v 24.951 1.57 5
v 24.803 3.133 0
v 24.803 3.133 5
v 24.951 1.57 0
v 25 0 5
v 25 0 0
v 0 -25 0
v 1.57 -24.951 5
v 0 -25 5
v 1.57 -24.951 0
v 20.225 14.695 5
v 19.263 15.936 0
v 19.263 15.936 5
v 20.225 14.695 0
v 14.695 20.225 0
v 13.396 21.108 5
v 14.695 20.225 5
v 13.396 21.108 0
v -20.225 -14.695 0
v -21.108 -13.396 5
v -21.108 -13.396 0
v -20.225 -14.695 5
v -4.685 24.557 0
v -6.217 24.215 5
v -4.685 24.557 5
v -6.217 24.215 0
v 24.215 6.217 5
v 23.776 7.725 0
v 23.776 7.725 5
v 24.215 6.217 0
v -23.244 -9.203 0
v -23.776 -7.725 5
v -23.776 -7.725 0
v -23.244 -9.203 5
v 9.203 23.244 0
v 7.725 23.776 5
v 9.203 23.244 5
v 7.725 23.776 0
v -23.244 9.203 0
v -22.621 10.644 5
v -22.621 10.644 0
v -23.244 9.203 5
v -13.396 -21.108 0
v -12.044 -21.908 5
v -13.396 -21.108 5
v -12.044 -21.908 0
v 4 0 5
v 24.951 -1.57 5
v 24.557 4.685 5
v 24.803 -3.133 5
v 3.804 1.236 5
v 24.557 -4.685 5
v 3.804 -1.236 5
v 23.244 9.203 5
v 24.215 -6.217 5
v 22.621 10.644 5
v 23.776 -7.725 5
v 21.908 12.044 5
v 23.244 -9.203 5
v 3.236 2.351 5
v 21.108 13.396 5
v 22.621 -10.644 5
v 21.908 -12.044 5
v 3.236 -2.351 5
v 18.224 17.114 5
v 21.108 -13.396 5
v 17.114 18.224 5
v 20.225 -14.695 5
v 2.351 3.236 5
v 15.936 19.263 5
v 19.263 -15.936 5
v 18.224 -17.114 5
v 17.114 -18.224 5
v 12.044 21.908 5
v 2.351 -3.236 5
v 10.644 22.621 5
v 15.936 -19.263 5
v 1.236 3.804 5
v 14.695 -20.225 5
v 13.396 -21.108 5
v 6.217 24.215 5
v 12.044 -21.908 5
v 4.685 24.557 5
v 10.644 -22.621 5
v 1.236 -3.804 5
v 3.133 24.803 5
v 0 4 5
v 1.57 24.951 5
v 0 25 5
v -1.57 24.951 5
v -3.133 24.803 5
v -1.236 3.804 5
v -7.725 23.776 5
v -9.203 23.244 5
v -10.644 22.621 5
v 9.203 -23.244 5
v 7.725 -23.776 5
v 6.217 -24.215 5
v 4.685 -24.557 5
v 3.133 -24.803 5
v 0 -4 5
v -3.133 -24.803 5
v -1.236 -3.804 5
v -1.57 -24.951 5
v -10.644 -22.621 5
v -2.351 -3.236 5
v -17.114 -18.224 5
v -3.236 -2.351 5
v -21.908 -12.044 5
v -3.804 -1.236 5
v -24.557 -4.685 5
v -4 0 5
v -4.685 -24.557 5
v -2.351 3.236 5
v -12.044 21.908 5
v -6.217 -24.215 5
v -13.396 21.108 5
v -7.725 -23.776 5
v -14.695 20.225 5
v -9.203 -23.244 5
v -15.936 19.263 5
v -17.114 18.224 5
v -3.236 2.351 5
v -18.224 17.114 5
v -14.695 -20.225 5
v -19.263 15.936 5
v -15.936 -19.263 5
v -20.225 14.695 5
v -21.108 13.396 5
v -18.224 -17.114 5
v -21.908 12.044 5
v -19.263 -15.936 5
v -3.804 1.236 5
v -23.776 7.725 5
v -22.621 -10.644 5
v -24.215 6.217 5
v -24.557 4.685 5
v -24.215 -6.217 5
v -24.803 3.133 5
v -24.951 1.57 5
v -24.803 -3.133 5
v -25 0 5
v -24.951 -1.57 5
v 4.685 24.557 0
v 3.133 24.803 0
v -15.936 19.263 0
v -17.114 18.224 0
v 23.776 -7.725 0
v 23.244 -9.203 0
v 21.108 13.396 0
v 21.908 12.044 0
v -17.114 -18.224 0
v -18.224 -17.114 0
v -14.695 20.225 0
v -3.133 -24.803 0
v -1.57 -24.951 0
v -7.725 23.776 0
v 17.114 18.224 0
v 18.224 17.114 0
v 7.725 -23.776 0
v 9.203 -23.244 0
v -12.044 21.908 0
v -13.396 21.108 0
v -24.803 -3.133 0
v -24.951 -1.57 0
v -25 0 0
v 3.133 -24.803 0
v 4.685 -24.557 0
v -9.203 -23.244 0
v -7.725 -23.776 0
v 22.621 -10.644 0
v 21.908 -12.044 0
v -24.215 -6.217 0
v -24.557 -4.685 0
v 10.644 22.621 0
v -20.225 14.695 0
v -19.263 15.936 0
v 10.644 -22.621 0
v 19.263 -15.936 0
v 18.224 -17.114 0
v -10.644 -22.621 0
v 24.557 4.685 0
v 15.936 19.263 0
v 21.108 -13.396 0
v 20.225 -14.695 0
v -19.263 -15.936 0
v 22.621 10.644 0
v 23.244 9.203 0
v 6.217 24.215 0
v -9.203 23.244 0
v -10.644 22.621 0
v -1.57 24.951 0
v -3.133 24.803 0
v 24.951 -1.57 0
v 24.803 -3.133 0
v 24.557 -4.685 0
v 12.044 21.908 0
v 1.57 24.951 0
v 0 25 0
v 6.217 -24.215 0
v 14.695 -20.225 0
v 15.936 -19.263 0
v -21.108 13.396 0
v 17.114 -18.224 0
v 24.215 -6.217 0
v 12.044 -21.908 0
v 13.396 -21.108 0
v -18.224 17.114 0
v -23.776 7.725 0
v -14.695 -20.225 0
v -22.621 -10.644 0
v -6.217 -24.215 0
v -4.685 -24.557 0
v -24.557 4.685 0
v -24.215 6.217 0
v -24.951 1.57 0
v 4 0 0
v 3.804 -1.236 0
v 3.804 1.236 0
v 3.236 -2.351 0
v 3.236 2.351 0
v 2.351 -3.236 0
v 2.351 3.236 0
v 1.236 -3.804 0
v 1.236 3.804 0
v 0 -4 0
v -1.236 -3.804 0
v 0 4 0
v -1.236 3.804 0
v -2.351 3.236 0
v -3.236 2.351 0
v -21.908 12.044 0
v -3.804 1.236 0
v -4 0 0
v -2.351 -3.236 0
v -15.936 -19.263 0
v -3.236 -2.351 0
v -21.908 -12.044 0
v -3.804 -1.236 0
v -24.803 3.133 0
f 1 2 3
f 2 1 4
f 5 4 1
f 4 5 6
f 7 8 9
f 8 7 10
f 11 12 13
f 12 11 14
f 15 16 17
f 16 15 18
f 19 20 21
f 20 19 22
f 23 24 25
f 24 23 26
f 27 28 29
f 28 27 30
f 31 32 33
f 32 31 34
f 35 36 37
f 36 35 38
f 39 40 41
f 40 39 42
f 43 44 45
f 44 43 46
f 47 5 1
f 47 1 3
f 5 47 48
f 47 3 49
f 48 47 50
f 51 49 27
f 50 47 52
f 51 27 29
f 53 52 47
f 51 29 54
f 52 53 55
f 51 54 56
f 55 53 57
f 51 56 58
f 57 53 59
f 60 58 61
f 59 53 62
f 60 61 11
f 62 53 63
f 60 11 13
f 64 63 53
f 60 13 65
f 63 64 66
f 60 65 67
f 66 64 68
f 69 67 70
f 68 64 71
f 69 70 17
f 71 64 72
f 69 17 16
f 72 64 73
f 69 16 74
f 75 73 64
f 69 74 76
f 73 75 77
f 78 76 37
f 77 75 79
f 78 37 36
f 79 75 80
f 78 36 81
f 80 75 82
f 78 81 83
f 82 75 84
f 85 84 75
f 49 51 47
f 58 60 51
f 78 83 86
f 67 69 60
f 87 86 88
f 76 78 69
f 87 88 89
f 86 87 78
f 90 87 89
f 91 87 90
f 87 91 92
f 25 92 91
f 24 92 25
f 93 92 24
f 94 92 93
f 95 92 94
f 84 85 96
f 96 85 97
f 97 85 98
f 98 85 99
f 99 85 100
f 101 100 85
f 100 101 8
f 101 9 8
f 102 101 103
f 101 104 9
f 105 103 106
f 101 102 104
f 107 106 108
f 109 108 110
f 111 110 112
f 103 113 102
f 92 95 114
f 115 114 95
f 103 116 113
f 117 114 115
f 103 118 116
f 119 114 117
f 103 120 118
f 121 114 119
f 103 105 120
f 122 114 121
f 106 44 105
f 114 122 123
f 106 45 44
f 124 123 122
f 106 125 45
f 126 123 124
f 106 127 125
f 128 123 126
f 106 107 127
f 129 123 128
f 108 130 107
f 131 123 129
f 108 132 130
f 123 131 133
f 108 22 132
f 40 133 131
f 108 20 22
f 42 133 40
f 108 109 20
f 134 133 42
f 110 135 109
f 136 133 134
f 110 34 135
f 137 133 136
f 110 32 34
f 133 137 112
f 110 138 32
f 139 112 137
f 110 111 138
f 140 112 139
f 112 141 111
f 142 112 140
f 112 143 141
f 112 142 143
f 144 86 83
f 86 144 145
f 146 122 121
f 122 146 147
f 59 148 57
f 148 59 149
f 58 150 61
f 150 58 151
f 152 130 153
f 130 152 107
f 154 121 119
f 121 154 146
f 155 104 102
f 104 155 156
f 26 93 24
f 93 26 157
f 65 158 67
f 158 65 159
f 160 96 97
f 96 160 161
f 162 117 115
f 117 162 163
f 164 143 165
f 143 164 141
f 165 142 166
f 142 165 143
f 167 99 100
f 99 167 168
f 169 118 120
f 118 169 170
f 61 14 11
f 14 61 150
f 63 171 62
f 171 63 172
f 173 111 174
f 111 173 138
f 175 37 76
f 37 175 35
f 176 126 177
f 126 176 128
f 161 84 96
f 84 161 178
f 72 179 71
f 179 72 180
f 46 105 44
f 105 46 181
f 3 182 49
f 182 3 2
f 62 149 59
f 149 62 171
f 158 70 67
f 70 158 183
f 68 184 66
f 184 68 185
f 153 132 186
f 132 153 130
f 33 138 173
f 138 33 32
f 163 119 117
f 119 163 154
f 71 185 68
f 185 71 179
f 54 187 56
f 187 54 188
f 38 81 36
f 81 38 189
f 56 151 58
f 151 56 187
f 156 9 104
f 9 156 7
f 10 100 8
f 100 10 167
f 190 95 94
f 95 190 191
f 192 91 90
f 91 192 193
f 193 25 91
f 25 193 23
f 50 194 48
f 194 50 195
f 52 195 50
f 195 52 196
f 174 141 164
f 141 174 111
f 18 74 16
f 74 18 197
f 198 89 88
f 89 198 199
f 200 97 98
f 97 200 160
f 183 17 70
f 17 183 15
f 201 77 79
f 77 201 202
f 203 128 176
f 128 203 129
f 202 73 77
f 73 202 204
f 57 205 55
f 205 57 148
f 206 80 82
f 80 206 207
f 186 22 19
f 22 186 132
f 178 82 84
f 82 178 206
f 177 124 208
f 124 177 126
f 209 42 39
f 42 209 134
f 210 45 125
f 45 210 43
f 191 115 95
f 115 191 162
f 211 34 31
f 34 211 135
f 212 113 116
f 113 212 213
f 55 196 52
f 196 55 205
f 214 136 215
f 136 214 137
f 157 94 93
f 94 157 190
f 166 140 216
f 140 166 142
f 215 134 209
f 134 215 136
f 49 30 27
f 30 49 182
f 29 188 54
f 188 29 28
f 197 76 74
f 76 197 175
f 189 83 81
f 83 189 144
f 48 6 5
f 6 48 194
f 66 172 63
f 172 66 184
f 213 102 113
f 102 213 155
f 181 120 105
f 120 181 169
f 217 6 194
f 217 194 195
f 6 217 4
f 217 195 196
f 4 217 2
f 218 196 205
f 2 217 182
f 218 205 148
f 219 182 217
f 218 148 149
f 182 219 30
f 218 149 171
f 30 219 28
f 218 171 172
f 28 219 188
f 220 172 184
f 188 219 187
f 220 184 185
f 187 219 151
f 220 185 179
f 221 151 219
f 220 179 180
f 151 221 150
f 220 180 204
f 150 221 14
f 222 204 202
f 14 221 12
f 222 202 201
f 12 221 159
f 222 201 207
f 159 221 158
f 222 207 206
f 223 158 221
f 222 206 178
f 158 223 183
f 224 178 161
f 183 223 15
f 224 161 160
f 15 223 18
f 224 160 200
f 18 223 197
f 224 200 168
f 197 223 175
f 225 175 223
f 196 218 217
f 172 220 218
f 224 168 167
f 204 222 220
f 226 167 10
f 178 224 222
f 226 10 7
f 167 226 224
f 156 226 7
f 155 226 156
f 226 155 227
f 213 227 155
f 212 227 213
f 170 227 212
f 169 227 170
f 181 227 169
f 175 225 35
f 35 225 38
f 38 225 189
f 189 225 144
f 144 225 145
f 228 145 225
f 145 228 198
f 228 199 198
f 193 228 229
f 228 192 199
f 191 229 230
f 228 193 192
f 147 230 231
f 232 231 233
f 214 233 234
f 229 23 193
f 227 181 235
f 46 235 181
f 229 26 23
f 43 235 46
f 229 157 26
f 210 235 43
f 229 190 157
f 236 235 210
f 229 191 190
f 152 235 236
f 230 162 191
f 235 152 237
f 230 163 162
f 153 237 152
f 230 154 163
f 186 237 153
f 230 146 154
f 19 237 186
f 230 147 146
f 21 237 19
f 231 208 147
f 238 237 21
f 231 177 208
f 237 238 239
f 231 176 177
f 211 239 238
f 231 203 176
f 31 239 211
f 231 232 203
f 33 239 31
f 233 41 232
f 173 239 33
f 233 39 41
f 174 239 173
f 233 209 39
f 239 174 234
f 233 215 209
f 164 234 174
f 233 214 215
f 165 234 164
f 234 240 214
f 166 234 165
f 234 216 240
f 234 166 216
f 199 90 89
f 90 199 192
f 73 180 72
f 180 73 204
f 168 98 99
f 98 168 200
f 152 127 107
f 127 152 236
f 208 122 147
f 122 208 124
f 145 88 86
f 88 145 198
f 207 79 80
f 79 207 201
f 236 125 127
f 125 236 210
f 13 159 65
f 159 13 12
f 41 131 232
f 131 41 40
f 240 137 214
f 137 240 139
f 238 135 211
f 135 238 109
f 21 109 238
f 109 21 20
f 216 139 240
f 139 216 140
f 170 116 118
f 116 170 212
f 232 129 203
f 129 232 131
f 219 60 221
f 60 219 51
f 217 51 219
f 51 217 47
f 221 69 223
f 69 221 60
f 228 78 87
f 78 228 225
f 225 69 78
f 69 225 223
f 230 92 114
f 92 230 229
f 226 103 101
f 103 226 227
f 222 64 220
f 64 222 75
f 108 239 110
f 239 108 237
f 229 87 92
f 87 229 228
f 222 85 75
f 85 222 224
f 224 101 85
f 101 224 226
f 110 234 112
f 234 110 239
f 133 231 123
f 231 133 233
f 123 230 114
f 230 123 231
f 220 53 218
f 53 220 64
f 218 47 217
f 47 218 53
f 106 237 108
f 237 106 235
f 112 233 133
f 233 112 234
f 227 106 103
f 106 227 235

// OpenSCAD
//----------------------------------------------------------
//-- Tutorial OpenScad
//-- Juan Gonzalez-Gomez (Obijuan) juan@iearobotics.com
//----------------------------------------------------------
//-- (c) Mayo, 2012
//-- Licencia GPL
//----------------------------------------------------------
//-- Rueda parametrizada
//----------------------------------------------------------

//-- Parámetros de la rueda
grosor = 5;
diametro=50;
diam_eje = 8;


//-- Construcción de la rueda a partir de
//-- los parámetros
difference() {
  //-- Base de la rueda
  cylinder(r=diametro/2, h=grosor,$fn=100);

  //-- Taladro del eje
  cylinder(r=diam_eje/2, h=3*grosor,$fn=20,center=true);
}
